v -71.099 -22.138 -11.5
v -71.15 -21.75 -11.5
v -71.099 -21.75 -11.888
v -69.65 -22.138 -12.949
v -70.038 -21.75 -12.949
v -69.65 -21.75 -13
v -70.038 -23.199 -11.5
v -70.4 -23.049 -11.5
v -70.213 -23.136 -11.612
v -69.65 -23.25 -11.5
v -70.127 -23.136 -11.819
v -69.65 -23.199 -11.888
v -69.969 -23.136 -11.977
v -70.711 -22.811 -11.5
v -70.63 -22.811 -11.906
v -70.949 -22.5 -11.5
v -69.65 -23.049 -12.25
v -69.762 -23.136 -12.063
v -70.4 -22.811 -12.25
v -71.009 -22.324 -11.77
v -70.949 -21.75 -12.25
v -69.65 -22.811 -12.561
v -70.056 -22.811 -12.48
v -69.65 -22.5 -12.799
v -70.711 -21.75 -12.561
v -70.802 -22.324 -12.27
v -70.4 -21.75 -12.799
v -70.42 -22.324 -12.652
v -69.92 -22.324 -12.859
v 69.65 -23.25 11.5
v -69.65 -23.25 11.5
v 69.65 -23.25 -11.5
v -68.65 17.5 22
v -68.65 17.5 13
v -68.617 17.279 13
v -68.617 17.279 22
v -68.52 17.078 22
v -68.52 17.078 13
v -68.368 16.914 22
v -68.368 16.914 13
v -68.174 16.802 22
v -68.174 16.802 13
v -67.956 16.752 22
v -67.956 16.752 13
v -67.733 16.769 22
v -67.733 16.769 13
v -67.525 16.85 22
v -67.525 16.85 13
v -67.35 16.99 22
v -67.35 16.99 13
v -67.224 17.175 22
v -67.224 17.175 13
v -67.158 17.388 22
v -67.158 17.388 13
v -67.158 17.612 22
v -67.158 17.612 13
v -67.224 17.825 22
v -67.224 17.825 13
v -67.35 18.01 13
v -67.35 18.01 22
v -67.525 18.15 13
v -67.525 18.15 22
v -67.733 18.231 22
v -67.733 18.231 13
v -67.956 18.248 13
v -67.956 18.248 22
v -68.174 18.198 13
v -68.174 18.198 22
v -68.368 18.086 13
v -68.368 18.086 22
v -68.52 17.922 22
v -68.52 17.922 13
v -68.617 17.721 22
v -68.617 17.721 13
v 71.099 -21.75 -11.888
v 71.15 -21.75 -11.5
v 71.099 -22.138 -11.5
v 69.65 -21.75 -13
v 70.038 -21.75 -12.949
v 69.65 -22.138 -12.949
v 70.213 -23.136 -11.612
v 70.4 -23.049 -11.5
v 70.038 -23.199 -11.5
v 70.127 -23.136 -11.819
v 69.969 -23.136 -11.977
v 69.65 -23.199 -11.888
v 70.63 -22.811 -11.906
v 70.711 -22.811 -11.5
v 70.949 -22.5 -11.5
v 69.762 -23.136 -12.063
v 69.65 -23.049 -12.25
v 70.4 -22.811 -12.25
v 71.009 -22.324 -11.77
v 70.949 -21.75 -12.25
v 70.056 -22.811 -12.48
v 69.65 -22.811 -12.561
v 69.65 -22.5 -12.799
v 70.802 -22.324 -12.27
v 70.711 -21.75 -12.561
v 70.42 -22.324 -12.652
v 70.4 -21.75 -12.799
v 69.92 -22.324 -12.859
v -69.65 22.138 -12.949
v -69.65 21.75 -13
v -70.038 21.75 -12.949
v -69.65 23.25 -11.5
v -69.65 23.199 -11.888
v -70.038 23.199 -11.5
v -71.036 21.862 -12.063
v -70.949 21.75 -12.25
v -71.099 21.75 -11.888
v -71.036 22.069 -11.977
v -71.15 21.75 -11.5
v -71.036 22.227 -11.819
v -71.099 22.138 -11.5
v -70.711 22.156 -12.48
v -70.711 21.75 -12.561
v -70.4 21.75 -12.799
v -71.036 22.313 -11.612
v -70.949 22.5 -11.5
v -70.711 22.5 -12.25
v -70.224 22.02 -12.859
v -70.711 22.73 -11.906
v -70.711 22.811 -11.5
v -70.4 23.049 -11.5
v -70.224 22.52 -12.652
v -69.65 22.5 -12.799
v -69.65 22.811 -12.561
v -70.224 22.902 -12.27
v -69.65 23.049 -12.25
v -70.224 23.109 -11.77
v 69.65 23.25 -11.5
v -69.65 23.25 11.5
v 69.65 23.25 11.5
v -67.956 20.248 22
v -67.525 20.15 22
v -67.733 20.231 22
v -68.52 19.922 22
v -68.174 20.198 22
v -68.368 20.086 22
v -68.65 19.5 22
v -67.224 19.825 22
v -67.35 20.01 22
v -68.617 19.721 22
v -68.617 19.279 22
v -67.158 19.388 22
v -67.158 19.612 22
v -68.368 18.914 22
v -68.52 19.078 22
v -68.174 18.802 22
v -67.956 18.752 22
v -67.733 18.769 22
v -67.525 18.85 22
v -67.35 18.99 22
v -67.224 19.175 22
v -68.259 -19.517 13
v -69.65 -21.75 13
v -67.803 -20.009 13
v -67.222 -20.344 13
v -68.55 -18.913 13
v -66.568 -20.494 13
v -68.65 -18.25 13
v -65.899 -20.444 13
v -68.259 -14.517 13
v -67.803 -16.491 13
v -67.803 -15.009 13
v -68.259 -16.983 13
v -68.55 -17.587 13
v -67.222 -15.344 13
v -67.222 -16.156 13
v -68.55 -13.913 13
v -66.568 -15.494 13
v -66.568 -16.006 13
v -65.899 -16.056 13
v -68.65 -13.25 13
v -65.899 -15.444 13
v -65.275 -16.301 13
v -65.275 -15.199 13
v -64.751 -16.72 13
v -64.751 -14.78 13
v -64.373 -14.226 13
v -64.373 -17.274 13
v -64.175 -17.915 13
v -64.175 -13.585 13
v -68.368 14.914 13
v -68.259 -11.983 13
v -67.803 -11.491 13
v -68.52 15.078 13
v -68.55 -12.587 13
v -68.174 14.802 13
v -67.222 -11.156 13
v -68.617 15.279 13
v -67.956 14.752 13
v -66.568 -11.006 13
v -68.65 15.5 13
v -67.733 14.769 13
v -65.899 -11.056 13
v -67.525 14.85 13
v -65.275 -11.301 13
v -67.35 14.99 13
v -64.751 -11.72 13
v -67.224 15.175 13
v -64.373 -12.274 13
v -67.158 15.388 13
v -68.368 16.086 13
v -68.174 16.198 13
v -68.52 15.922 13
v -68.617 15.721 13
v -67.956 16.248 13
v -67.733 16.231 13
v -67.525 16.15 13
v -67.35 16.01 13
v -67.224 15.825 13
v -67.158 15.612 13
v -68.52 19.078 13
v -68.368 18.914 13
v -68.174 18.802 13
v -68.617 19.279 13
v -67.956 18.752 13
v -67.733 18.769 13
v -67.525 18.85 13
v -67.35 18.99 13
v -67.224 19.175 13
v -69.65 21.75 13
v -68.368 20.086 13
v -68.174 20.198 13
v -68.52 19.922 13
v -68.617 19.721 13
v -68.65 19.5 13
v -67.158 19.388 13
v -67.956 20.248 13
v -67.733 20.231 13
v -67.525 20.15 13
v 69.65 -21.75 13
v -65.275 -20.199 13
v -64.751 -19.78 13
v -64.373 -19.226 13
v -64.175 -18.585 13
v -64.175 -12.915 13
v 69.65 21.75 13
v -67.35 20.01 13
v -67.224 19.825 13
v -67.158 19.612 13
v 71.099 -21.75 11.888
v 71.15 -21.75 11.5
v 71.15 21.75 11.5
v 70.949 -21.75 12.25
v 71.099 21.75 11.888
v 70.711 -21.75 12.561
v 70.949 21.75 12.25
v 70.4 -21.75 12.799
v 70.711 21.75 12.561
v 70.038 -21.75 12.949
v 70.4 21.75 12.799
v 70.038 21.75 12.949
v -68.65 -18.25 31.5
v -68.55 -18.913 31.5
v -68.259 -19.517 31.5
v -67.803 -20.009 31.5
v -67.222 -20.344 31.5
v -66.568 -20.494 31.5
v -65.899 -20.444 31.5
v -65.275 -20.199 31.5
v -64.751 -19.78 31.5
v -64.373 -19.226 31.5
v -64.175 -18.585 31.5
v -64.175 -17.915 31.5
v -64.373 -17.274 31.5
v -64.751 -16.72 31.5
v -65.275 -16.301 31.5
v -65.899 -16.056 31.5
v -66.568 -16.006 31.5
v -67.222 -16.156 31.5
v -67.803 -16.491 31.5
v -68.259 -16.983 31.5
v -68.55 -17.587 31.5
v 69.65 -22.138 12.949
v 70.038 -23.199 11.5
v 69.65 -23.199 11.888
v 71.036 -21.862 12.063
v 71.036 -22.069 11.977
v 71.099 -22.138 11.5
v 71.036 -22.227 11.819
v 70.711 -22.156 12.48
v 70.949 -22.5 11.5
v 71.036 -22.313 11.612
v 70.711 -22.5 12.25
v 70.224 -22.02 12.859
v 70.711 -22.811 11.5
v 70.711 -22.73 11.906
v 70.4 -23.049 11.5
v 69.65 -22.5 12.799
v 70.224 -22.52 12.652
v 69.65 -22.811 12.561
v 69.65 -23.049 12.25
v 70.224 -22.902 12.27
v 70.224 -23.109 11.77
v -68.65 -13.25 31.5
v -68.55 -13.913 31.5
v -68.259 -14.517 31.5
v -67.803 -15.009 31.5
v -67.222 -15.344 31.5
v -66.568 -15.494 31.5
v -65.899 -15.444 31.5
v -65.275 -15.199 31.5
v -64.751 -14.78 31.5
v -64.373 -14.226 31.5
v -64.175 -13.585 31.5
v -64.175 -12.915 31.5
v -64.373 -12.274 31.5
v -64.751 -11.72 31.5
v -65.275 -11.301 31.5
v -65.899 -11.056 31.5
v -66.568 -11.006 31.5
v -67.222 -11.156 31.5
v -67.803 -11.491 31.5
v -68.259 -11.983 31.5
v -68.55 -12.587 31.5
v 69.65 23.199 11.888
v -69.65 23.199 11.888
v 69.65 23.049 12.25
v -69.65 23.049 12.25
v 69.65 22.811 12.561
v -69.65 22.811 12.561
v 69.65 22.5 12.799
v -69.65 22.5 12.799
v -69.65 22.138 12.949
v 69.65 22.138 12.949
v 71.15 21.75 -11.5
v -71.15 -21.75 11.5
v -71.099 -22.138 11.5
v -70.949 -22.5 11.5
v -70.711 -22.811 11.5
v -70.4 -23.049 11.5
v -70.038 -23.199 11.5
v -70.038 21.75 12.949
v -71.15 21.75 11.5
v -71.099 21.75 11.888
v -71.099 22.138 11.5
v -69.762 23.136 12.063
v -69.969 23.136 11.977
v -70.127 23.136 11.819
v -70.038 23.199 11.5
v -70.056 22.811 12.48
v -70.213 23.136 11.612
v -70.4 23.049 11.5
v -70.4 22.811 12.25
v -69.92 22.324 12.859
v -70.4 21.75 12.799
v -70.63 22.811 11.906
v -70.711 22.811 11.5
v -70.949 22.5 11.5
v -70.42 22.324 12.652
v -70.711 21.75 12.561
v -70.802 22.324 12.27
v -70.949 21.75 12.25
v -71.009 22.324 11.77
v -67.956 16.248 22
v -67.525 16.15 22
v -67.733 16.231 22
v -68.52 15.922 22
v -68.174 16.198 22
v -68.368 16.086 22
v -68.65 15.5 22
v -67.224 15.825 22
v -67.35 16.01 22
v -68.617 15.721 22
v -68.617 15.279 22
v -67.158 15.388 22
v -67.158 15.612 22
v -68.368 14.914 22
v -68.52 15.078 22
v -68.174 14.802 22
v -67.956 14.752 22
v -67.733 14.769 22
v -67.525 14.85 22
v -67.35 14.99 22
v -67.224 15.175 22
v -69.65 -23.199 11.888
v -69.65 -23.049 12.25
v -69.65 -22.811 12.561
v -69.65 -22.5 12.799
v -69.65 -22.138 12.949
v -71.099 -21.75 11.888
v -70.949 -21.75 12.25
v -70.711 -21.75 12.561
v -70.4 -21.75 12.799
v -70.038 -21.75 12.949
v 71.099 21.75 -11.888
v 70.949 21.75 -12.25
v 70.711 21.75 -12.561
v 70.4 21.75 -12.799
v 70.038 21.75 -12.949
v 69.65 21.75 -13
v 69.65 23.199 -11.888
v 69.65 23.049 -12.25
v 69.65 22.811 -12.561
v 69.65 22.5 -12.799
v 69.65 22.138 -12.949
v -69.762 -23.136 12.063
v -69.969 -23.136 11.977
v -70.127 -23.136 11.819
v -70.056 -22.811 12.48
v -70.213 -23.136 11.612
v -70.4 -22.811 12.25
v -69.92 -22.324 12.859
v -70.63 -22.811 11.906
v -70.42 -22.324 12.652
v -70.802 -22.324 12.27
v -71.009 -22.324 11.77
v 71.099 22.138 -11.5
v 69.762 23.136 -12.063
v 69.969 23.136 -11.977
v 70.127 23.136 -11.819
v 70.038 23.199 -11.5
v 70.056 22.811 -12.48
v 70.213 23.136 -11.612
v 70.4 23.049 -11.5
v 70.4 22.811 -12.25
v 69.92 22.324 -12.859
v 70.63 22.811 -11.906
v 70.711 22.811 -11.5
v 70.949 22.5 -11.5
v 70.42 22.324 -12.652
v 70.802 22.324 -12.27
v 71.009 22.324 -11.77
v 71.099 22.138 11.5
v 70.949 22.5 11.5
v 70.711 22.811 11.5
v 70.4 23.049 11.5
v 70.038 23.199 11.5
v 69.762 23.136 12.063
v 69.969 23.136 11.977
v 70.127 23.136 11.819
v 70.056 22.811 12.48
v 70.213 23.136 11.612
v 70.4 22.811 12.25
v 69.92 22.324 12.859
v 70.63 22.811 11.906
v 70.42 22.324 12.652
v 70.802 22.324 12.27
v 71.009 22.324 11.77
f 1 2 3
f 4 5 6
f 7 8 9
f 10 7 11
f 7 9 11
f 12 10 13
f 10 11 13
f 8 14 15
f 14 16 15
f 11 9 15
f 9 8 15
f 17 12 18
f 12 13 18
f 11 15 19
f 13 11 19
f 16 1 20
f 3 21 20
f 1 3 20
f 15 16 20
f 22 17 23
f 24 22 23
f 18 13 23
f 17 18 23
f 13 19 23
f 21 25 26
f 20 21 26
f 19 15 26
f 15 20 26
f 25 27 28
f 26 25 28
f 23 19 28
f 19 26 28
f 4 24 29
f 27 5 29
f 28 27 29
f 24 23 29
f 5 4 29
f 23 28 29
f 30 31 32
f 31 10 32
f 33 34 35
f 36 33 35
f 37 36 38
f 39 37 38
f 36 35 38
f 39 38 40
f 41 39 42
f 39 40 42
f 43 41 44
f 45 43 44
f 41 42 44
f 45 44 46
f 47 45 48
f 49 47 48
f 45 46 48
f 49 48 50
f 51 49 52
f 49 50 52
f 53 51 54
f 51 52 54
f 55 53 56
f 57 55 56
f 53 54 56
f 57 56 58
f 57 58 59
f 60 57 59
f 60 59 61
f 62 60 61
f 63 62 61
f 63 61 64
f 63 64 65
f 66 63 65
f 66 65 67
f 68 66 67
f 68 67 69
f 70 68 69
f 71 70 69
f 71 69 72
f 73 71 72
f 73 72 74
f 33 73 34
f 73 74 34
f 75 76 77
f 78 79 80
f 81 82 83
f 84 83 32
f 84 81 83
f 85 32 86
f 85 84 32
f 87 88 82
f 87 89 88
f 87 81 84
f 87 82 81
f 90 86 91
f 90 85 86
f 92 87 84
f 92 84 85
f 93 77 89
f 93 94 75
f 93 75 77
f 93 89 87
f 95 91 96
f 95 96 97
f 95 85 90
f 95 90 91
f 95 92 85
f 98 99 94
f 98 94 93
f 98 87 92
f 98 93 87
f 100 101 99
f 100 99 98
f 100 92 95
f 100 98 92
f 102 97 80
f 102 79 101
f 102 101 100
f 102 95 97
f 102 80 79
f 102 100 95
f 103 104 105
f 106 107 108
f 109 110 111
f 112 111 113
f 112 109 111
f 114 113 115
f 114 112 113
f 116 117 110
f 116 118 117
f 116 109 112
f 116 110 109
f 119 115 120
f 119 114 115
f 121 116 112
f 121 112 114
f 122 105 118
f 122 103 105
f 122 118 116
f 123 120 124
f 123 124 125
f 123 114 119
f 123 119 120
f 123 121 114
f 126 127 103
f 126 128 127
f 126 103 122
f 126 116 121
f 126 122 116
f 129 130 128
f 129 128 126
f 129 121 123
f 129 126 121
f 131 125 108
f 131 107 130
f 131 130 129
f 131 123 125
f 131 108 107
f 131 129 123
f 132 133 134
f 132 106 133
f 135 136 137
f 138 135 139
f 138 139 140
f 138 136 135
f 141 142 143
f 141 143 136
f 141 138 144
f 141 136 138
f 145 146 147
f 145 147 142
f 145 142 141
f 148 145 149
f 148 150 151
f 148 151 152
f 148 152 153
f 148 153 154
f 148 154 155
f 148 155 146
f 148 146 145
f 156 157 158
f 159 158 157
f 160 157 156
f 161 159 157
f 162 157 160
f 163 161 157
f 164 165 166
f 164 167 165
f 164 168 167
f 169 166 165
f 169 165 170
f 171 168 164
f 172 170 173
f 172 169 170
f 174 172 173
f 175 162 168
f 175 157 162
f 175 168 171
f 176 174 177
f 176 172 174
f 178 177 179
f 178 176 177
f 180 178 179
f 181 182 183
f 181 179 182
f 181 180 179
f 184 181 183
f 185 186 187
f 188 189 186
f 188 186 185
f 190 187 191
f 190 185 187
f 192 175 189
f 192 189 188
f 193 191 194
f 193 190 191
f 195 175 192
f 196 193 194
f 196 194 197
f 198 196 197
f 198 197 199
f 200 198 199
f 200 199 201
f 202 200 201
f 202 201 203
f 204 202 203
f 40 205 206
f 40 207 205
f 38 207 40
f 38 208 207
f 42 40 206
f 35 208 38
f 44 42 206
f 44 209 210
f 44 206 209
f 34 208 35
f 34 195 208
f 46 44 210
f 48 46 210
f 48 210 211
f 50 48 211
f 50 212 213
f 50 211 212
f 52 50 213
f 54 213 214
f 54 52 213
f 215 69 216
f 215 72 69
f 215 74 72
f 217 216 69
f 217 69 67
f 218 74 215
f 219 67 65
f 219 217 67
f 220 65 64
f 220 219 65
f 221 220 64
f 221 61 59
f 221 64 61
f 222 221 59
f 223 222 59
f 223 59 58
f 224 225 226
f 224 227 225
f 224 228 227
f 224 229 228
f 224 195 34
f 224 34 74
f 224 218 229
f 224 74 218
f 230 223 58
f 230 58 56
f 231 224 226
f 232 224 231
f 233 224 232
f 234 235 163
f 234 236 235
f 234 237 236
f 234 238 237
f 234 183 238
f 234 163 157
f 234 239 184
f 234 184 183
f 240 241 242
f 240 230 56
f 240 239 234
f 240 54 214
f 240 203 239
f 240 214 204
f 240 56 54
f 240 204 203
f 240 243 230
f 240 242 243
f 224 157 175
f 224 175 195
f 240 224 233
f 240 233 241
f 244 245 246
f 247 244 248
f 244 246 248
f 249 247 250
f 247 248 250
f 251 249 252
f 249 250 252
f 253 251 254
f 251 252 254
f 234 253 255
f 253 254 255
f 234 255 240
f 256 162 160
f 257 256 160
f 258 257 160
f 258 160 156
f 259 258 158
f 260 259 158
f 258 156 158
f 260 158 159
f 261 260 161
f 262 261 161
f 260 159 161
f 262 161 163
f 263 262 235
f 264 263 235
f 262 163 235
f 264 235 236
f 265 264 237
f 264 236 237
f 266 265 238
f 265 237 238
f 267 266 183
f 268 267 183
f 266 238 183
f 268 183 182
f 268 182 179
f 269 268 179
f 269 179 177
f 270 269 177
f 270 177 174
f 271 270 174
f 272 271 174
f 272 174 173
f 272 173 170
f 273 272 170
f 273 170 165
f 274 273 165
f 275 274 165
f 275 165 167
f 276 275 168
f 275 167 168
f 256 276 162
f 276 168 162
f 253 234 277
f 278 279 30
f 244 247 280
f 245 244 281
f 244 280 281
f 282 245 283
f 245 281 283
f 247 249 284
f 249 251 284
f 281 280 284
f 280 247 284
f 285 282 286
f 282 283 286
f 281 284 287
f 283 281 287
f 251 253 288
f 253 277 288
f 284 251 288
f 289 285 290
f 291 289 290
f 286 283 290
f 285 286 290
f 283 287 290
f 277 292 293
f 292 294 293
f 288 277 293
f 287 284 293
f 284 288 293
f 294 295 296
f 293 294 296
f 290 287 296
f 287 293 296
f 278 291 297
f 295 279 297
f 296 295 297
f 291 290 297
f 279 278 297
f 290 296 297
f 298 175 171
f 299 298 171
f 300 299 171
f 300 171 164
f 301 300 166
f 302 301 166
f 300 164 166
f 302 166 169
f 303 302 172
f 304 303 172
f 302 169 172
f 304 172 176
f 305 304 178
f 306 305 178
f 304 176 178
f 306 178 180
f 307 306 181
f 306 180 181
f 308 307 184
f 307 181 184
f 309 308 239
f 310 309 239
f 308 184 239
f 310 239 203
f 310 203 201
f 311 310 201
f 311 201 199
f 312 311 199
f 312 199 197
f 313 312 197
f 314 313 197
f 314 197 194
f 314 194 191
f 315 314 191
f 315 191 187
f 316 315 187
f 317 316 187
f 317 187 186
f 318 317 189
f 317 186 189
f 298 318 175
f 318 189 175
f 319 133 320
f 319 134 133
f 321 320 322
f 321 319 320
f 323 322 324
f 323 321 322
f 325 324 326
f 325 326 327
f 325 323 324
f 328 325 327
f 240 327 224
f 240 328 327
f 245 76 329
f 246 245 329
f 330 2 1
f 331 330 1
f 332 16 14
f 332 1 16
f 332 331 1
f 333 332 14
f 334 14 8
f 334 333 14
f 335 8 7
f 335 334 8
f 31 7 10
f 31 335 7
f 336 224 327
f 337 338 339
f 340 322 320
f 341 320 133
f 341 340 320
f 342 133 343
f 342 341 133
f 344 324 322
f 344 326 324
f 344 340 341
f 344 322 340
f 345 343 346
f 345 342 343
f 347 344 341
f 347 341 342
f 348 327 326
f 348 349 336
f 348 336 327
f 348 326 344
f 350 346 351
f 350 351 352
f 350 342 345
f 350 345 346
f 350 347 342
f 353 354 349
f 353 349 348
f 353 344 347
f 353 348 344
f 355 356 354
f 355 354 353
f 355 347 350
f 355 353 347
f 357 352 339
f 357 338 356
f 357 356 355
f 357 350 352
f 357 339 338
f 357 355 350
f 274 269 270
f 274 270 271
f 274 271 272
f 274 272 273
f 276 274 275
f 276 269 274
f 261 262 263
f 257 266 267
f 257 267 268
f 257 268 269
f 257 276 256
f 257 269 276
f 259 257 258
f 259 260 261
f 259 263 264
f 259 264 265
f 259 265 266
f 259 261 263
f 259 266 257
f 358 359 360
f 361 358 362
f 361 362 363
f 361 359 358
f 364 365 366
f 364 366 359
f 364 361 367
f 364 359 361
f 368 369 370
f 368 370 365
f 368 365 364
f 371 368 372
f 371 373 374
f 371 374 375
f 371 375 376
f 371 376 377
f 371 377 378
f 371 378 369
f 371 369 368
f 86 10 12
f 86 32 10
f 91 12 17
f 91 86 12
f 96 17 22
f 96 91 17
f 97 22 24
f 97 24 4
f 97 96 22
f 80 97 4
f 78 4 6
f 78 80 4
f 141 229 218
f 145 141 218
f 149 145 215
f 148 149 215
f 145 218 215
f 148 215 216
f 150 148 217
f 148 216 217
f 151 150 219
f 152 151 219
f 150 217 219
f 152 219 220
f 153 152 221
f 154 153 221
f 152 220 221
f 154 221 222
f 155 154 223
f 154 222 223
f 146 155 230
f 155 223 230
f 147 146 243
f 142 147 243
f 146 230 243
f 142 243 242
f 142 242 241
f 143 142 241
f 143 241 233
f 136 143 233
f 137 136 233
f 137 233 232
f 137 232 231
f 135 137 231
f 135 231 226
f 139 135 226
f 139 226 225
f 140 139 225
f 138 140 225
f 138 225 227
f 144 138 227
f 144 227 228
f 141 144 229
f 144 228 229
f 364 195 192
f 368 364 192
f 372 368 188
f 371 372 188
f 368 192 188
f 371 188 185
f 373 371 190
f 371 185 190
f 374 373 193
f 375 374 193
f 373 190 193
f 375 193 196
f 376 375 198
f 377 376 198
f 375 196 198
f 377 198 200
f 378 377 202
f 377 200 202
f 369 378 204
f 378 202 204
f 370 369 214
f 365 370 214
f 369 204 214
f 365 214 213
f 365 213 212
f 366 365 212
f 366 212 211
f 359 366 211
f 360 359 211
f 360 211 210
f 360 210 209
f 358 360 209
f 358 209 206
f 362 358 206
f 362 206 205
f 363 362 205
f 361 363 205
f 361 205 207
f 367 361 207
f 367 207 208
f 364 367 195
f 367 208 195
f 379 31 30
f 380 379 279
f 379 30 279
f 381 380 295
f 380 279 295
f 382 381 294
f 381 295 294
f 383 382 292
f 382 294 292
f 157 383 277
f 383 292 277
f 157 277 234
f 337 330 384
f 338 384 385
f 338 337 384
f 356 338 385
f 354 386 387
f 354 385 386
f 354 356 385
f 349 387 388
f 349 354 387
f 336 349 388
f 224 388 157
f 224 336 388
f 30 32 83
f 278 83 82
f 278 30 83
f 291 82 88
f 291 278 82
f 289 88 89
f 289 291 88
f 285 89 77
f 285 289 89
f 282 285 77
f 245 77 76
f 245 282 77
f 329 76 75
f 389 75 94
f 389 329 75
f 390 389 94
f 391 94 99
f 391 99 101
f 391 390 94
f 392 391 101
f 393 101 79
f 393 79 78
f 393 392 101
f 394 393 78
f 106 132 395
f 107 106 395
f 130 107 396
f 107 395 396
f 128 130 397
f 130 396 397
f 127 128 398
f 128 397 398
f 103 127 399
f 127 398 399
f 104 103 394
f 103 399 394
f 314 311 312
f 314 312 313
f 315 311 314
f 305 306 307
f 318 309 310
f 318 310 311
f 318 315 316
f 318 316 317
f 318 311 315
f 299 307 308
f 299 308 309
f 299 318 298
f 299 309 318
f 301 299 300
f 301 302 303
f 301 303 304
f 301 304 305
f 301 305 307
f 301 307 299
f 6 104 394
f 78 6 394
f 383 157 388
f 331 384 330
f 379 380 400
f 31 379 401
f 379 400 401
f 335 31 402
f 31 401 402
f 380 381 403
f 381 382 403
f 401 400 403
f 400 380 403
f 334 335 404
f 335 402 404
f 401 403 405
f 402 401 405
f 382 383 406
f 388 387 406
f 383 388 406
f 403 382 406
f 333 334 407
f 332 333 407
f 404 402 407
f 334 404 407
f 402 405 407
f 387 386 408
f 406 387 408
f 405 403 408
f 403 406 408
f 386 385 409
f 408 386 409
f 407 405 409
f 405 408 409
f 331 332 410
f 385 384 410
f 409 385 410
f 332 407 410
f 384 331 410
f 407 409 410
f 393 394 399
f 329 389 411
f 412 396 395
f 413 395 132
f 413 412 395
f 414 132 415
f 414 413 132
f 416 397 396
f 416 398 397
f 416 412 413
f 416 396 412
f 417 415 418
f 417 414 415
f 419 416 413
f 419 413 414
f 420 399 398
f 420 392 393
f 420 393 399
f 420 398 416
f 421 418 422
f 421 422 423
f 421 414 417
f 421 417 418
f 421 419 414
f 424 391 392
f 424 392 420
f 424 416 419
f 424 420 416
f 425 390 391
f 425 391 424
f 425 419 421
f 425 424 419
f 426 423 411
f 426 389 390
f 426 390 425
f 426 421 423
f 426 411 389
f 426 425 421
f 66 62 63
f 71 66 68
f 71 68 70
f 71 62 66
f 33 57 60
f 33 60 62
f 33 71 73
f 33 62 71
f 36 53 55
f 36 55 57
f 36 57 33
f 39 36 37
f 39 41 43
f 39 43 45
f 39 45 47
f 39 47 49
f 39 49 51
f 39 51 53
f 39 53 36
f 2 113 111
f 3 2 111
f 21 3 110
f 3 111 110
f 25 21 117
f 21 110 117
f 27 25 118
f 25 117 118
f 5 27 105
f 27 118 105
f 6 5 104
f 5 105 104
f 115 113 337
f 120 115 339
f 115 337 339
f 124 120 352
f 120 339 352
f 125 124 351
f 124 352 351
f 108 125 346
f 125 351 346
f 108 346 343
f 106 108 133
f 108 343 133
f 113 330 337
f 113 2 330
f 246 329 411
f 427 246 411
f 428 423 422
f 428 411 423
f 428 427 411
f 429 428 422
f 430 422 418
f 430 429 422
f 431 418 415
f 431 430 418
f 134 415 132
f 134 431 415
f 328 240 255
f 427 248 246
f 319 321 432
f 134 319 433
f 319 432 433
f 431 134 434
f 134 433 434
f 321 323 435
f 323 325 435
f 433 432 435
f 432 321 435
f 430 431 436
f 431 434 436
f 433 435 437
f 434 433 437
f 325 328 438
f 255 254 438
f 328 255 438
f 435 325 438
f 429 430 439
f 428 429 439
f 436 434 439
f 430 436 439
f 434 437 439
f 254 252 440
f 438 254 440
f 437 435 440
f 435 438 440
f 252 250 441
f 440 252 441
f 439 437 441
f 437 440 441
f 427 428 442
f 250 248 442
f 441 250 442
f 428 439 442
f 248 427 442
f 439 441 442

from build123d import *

# Parameters (mm, degrees)
BOSS_EXTRUDE1_DEPTH      = 13
BOSS_EXTRUDE1_DEPTH_BACK = 13
SKETCH1_W                = 142.3
SKETCH1_H                = 46.5
FILLET1_R                = 1.5
SKETCH2_R                = 2.25
BOSS_EXTRUDE2_DEPTH      = 18.5
SKETCH3_R                = 0.75
BOSS_EXTRUDE3_DEPTH      = 9


with BuildPart() as part:
    # Sketch1 → Boss-Extrude1 (new, two sides: drawn at the far end of the back side and taken through both)
    with BuildSketch(Plane.XY.offset(-BOSS_EXTRUDE1_DEPTH_BACK)):
        Rectangle(SKETCH1_W, SKETCH1_H)
    extrude(amount=BOSS_EXTRUDE1_DEPTH + BOSS_EXTRUDE1_DEPTH_BACK)

    # Fillet1
    fillet1_edges = [part.edges().sort_by_distance(p)[0] for p in [
        (-71.15, 0, -13),
        (0, -23.25, -13),
        (-71.15, -23.25, 0),
        (71.15, 0, -13),
        (71.15, -23.25, 0),
        (0, 23.25, -13),
        (71.15, 23.25, 0),
        (-71.15, 23.25, 0),
        (0, 23.25, 13),
        (71.15, 0, 13),
        (0, -23.25, 13),
        (-71.15, 0, 13),
    ]]
    fillet(fillet1_edges, radius=FILLET1_R)

    # Sketch2 → Boss-Extrude2 (add)
    with BuildSketch(Plane.XY.offset(13)):
        with Locations((-66.4, -18.25)):
            Circle(SKETCH2_R)
        with Locations((-66.4, -13.25)):
            Circle(SKETCH2_R)
    extrude(amount=BOSS_EXTRUDE2_DEPTH)

    # Sketch3 → Boss-Extrude3 (add)
    with BuildSketch(Plane.XY.offset(13)):
        with Locations((-67.9, 19.5)):
            Circle(SKETCH3_R)
        with Locations((-67.9, 17.5)):
            Circle(SKETCH3_R)
        with Locations((-67.9, 15.5)):
            Circle(SKETCH3_R)
    extrude(amount=BOSS_EXTRUDE3_DEPTH)


solid = part.part
